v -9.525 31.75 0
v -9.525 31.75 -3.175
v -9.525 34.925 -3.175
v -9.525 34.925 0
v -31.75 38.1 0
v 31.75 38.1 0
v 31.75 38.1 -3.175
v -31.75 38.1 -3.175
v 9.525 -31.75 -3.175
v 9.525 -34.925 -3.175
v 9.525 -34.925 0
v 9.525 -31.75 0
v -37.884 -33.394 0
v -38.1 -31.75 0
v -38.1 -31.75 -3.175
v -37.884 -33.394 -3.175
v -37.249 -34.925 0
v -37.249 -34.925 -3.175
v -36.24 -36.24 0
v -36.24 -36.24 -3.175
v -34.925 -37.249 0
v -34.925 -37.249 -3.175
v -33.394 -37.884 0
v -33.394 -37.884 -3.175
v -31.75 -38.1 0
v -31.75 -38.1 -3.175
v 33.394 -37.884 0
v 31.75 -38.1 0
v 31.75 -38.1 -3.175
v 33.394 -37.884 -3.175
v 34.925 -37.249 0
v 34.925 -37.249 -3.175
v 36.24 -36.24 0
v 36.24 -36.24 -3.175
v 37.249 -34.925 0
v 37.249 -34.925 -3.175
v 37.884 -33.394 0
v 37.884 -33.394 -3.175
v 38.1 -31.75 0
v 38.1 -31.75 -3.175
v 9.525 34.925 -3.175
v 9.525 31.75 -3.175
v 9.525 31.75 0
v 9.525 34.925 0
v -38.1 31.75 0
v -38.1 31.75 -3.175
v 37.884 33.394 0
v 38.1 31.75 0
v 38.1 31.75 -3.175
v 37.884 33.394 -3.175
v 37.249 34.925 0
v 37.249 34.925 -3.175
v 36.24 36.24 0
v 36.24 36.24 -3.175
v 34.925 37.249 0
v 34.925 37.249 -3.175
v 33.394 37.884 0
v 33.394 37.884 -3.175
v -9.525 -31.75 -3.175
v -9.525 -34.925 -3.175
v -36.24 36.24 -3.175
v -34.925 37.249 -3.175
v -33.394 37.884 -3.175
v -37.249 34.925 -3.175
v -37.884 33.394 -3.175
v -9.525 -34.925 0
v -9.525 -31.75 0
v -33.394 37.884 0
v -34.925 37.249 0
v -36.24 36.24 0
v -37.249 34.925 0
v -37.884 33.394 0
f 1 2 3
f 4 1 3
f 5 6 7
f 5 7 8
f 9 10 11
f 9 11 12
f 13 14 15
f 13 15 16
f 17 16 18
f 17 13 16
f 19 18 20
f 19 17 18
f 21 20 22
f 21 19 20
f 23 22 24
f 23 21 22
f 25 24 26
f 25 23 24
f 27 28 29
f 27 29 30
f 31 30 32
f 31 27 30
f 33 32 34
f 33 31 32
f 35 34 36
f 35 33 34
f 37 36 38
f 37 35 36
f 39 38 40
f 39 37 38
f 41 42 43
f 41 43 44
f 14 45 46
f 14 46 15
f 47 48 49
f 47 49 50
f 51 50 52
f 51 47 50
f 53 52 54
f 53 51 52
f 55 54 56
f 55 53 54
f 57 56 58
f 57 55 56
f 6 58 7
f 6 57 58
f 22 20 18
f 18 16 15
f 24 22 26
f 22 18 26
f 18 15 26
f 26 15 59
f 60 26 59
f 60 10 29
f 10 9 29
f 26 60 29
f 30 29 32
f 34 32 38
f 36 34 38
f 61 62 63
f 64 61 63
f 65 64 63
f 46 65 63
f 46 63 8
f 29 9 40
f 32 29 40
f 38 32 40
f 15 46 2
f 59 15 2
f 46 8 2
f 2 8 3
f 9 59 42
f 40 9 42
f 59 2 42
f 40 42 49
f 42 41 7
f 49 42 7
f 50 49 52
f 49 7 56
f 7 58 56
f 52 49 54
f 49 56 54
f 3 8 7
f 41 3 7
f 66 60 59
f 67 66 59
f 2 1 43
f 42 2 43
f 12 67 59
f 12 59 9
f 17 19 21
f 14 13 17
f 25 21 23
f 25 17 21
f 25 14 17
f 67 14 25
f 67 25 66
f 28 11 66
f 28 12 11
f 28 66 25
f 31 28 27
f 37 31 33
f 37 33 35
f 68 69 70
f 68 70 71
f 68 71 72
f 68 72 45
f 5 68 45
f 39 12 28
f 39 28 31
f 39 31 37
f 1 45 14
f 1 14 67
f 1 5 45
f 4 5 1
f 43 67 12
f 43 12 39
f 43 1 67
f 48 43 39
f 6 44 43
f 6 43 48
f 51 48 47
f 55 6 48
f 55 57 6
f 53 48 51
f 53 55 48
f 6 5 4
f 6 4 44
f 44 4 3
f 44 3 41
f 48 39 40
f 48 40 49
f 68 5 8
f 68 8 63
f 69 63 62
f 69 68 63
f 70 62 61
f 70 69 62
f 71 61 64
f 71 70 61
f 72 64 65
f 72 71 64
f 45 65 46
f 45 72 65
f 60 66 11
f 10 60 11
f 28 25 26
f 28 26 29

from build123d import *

# Parameters (mm, degrees)
F0_W     = 19.05
F0_H     = 3.175
F1_DEPTH = 3.175


# Not quite as in the source:
# - a length typed as a fraction of an inch, garbled in the dataset ("3 / 203.2 mm" for 3/8 in), is restored


with BuildPart() as f1:
    # F0 (on Top) → F1 (new body)
    with BuildSketch(Plane.XY):
        with BuildLine():
            Line((31.75, 38.1), (-31.75, 38.1))
            ThreePointArc((-31.75, 38.1), (-36.2401280605, 36.2401280605), (-38.1, 31.75))
            Line((-38.1, 31.75), (-38.1, -31.75))
            ThreePointArc((-38.1, -31.75), (-36.2401280605, -36.2401280605), (-31.75, -38.1))
            Line((-31.75, -38.1), (31.75, -38.1))
            ThreePointArc((31.75, -38.1), (36.2401280605, -36.2401280605), (38.1, -31.75))
            Line((38.1, -31.75), (38.1, 31.75))
            ThreePointArc((38.1, 31.75), (36.2401280605, 36.2401280605), (31.75, 38.1))
        make_face()
        with Locations((0, -33.3375)):
            Rectangle(F0_W, F0_H, mode=Mode.SUBTRACT)
        with Locations((0, 33.3375)):
            Rectangle(F0_W, F0_H, mode=Mode.SUBTRACT)
    extrude(amount=-F1_DEPTH)


solid = f1.part
